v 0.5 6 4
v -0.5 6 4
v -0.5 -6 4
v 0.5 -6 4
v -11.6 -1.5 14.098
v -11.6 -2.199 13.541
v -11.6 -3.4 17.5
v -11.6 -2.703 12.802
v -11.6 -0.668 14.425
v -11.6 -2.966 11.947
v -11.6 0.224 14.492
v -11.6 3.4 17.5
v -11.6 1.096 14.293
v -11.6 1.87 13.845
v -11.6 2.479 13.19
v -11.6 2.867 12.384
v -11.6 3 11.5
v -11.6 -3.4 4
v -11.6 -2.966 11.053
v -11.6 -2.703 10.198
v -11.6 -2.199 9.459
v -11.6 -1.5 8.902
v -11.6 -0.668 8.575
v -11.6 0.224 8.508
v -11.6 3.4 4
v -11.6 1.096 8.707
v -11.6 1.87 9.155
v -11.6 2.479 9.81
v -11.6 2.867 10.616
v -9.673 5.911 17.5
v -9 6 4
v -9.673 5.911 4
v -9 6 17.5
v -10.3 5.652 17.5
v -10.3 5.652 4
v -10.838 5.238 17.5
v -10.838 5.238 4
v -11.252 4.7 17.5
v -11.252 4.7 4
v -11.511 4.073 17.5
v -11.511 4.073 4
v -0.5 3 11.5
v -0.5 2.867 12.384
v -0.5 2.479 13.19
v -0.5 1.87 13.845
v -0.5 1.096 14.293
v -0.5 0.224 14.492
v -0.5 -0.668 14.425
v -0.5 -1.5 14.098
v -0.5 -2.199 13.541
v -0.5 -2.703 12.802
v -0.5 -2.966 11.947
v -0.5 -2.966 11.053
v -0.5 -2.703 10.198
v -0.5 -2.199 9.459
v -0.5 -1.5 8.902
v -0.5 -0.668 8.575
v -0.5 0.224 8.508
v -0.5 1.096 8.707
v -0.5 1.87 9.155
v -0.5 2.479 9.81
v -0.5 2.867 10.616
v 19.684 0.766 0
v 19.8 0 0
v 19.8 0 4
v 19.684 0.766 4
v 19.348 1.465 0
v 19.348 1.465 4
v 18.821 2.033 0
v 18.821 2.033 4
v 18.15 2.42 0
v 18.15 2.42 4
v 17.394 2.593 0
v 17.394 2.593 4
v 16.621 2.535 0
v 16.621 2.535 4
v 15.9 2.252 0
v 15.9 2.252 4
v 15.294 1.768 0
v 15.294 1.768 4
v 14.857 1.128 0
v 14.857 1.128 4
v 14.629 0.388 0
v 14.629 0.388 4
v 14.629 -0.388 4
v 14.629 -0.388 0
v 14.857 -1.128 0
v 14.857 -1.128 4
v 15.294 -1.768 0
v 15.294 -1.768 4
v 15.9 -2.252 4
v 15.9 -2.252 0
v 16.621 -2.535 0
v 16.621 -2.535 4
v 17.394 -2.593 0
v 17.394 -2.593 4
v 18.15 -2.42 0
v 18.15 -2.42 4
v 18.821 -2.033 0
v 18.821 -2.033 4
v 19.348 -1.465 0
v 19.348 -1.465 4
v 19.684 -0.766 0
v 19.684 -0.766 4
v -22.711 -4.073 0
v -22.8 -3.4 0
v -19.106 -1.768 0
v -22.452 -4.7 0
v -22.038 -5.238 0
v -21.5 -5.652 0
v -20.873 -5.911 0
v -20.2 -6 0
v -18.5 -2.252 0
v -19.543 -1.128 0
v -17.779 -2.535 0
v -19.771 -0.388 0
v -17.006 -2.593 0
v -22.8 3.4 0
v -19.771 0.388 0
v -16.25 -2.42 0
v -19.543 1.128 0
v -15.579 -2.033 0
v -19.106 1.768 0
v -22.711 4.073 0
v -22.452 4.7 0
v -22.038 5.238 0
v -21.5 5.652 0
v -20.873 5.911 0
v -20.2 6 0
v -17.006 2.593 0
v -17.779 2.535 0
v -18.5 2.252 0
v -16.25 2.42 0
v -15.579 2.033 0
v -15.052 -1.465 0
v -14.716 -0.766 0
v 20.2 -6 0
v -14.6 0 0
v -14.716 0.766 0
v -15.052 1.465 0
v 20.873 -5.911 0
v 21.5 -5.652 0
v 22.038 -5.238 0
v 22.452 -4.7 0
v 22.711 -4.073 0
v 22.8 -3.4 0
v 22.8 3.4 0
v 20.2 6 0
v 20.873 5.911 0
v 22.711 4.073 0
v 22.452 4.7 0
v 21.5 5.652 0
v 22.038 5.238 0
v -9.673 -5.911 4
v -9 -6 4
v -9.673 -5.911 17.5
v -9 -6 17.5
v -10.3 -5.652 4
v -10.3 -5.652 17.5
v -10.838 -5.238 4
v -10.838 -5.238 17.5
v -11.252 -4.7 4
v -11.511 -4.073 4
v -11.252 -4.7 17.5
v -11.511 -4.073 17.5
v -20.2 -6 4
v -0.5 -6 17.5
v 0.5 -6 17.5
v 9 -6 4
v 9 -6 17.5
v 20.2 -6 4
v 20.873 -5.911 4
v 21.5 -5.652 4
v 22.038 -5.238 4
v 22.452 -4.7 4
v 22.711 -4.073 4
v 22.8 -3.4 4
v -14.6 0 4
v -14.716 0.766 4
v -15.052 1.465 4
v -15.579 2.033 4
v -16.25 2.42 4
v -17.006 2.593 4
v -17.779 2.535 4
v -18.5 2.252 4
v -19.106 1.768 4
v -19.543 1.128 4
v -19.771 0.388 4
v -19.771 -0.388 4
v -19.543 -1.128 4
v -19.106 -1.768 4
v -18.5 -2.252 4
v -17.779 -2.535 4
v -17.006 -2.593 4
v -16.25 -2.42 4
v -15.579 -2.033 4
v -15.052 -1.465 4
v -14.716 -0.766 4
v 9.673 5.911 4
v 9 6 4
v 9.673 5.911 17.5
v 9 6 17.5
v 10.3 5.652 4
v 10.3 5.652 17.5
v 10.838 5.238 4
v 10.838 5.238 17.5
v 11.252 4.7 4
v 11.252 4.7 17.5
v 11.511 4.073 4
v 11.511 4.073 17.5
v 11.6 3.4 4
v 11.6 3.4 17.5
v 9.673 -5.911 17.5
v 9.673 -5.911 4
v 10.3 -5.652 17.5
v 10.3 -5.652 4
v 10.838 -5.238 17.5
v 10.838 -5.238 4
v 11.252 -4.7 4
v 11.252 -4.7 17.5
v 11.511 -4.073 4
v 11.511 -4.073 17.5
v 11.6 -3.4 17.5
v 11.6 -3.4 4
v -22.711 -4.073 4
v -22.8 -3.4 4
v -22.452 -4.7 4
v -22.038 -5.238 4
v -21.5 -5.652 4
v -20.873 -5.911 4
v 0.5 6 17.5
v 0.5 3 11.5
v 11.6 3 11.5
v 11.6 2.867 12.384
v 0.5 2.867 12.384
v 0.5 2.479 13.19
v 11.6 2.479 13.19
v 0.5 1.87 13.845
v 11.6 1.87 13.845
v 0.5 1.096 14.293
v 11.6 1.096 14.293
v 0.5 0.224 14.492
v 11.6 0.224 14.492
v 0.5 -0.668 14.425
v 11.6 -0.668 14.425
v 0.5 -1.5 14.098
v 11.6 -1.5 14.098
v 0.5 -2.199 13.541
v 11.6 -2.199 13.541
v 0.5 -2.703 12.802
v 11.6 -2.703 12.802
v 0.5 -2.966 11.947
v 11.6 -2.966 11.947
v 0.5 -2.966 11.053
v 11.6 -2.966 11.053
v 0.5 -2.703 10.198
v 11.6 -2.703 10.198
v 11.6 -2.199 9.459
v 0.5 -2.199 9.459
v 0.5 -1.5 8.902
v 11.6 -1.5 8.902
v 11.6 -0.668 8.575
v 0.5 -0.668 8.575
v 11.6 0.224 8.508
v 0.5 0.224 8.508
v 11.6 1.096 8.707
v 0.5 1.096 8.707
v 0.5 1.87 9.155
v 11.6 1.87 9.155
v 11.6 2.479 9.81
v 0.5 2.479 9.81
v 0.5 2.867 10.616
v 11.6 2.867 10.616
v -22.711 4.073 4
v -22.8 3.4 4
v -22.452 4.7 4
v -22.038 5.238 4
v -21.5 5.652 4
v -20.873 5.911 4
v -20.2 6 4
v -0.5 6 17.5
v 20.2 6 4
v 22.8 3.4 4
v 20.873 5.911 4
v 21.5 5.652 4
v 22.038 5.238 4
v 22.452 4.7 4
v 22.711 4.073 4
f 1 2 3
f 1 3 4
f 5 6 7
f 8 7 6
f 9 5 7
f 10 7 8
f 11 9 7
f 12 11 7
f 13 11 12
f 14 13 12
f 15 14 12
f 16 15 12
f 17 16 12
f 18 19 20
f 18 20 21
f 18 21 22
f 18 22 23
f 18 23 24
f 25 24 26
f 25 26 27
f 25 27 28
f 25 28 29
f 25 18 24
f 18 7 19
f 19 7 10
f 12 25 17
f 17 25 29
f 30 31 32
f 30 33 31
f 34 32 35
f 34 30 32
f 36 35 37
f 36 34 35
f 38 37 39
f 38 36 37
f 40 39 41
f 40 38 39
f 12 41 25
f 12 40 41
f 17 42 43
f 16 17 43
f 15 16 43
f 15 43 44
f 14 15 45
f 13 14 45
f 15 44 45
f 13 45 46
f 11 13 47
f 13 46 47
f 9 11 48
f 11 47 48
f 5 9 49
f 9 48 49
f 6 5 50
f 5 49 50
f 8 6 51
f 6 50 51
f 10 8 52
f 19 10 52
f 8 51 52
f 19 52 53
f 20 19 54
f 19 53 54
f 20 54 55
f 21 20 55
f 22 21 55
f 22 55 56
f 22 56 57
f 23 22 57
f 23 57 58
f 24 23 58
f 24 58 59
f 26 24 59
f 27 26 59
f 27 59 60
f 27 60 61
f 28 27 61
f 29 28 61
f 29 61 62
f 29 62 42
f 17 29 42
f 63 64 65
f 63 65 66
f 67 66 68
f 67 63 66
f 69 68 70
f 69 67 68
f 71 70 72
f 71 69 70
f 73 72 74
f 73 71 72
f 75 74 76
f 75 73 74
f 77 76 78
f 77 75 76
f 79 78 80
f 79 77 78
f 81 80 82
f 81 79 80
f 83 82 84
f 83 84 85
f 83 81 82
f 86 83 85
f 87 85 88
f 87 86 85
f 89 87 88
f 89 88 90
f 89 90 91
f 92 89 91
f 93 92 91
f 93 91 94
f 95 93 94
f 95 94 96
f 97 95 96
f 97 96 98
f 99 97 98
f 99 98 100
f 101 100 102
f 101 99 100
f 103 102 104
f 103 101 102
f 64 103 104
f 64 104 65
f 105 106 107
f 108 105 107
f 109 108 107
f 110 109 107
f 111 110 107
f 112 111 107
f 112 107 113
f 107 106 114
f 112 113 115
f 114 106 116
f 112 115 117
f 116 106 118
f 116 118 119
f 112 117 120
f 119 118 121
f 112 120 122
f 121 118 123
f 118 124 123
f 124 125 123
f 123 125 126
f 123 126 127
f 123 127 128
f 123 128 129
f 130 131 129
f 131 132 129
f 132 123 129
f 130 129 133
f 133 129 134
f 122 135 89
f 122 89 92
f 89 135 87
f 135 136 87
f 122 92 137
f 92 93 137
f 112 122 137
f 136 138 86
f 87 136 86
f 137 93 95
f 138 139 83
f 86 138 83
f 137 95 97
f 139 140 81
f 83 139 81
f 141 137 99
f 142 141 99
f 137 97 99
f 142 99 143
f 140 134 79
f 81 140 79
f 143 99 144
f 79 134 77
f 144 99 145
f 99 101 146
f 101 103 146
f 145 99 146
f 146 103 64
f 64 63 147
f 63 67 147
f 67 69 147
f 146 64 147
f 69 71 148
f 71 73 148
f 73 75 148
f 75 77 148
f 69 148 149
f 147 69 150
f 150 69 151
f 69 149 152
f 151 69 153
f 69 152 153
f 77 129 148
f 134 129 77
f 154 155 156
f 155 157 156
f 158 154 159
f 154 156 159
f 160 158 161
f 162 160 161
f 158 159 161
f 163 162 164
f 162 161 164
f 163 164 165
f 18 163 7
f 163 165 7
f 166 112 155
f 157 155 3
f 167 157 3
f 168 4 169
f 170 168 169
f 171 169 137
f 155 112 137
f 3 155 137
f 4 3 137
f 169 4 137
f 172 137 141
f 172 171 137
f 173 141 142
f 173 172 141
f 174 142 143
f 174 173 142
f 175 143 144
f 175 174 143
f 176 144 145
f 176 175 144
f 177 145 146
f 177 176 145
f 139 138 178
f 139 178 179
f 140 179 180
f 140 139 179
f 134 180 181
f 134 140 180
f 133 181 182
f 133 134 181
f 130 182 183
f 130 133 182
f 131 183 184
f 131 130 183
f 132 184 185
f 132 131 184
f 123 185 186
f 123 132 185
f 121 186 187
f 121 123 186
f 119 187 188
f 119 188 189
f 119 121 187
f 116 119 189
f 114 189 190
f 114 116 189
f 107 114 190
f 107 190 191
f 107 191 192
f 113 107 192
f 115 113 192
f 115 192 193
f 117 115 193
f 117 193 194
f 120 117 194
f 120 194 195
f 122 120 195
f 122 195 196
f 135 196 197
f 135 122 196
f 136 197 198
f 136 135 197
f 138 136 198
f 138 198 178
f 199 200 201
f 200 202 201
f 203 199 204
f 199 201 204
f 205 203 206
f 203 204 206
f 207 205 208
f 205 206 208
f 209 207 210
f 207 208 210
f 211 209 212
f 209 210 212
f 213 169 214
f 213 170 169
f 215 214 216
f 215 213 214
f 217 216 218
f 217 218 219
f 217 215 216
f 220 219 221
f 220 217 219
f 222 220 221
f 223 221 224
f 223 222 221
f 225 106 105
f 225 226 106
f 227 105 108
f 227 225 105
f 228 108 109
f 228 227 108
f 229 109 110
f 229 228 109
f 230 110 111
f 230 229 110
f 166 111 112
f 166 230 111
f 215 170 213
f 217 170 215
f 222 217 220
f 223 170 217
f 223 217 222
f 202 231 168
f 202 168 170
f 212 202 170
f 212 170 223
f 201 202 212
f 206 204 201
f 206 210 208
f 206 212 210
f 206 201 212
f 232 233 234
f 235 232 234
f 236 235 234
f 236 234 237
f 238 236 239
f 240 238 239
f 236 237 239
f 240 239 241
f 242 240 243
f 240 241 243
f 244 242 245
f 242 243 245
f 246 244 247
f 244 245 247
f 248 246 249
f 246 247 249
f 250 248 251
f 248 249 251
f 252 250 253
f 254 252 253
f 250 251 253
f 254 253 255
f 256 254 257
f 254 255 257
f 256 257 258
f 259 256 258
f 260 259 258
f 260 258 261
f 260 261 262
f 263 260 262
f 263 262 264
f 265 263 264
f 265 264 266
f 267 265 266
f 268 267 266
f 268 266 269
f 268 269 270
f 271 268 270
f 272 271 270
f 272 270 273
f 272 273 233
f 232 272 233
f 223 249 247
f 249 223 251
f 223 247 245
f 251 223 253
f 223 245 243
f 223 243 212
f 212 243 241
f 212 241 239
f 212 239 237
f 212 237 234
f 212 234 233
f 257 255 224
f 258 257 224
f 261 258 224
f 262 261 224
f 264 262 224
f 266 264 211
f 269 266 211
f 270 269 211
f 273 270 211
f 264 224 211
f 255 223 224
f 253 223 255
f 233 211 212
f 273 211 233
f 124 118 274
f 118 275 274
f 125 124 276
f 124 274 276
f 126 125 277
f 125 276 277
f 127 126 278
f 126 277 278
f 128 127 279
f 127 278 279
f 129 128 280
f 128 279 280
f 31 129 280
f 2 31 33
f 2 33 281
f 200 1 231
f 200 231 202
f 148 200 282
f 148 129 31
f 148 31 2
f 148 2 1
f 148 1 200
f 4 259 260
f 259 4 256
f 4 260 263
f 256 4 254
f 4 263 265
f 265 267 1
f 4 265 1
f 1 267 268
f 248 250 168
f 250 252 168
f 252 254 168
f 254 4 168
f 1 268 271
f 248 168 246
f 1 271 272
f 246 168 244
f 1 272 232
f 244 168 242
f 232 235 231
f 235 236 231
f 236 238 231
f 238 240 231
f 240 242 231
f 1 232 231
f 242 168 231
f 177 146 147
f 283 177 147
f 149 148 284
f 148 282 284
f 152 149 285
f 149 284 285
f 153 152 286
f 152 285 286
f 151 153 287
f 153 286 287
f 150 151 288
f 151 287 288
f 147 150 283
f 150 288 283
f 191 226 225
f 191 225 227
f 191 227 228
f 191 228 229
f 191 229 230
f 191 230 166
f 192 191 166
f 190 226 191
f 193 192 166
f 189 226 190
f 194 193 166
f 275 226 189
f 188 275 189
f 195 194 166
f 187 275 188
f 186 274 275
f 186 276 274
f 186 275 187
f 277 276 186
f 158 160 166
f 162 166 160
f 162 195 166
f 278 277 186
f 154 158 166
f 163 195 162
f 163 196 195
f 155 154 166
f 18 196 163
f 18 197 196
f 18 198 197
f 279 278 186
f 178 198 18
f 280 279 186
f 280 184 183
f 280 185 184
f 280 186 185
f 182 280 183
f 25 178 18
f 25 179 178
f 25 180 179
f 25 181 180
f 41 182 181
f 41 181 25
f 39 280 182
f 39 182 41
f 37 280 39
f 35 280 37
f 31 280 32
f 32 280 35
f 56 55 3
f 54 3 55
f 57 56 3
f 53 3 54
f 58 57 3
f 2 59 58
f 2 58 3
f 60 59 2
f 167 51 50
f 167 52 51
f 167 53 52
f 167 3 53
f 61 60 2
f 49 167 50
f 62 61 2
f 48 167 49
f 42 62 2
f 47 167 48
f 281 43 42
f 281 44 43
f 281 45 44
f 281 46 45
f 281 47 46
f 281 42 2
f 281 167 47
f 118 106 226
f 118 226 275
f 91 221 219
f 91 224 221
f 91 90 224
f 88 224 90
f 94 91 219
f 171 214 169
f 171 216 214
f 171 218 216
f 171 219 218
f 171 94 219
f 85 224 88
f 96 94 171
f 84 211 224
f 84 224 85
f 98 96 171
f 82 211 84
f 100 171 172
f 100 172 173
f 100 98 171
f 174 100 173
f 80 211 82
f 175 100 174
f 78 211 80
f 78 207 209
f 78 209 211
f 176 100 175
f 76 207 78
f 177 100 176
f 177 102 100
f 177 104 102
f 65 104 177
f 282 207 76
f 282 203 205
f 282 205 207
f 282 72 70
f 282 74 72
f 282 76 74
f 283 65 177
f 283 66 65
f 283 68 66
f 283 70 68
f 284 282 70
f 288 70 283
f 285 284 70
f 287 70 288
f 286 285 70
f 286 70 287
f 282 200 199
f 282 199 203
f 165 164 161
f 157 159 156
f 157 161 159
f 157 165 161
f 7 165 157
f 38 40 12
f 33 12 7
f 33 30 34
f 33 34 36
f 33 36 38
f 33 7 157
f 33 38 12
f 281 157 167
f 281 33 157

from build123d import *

# Parameters (mm, degrees)
F3_W      = 45.6
F3_H      = 12
F3_R      = 2.6
F4_DEPTH  = 4
F5_W      = 23.2
F5_H      = 12
F6_DEPTH  = 13.5
F7_R      = 3
F8_DEPTH  = 23.2
F9_W      = 1
F9_H      = 12
F10_DEPTH = 13.5
F11_R     = 2.6


with BuildPart() as f4:
    # F3 (on Top) → F4 (new body)
    with BuildSketch(Plane.XY):
        Rectangle(F3_W, F3_H)
        with Locations((-17.2, 0)):
            Circle(F3_R, mode=Mode.SUBTRACT)
        with Locations((17.2, 0)):
            Circle(F3_R, mode=Mode.SUBTRACT)
    extrude(amount=F4_DEPTH)

    # F5 (on face) → F6 (join)
    with BuildSketch(Plane.XY.offset(4)):
        Rectangle(F5_W, F5_H)
    extrude(amount=F6_DEPTH)

    # F7 (on face) → F8 (cut, through all)
    with BuildSketch(Plane.YZ.offset(11.6)):
        with Locations((0, 11.5)):
            Circle(F7_R)
    extrude(amount=-F8_DEPTH, mode=Mode.SUBTRACT)

    # F9 (on face) → F10 (cut, through all)
    with BuildSketch(Plane.XY.offset(17.5)):
        Rectangle(F9_W, F9_H)
    extrude(amount=-F10_DEPTH, mode=Mode.SUBTRACT)

    # F11
    f11_edges = [f4.edges().sort_by_distance(p)[0] for p in [
        (-22.8, -6, 2),
        (-22.8, 6, 2),
        (22.8, -6, 2),
        (22.8, 6, 2),
        (-11.6, 6, 10.75),
        (-11.6, -6, 10.75),
        (11.6, 6, 10.75),
        (11.6, -6, 10.75),
    ]]
    fillet(f11_edges, radius=F11_R)


solid = f4.part
